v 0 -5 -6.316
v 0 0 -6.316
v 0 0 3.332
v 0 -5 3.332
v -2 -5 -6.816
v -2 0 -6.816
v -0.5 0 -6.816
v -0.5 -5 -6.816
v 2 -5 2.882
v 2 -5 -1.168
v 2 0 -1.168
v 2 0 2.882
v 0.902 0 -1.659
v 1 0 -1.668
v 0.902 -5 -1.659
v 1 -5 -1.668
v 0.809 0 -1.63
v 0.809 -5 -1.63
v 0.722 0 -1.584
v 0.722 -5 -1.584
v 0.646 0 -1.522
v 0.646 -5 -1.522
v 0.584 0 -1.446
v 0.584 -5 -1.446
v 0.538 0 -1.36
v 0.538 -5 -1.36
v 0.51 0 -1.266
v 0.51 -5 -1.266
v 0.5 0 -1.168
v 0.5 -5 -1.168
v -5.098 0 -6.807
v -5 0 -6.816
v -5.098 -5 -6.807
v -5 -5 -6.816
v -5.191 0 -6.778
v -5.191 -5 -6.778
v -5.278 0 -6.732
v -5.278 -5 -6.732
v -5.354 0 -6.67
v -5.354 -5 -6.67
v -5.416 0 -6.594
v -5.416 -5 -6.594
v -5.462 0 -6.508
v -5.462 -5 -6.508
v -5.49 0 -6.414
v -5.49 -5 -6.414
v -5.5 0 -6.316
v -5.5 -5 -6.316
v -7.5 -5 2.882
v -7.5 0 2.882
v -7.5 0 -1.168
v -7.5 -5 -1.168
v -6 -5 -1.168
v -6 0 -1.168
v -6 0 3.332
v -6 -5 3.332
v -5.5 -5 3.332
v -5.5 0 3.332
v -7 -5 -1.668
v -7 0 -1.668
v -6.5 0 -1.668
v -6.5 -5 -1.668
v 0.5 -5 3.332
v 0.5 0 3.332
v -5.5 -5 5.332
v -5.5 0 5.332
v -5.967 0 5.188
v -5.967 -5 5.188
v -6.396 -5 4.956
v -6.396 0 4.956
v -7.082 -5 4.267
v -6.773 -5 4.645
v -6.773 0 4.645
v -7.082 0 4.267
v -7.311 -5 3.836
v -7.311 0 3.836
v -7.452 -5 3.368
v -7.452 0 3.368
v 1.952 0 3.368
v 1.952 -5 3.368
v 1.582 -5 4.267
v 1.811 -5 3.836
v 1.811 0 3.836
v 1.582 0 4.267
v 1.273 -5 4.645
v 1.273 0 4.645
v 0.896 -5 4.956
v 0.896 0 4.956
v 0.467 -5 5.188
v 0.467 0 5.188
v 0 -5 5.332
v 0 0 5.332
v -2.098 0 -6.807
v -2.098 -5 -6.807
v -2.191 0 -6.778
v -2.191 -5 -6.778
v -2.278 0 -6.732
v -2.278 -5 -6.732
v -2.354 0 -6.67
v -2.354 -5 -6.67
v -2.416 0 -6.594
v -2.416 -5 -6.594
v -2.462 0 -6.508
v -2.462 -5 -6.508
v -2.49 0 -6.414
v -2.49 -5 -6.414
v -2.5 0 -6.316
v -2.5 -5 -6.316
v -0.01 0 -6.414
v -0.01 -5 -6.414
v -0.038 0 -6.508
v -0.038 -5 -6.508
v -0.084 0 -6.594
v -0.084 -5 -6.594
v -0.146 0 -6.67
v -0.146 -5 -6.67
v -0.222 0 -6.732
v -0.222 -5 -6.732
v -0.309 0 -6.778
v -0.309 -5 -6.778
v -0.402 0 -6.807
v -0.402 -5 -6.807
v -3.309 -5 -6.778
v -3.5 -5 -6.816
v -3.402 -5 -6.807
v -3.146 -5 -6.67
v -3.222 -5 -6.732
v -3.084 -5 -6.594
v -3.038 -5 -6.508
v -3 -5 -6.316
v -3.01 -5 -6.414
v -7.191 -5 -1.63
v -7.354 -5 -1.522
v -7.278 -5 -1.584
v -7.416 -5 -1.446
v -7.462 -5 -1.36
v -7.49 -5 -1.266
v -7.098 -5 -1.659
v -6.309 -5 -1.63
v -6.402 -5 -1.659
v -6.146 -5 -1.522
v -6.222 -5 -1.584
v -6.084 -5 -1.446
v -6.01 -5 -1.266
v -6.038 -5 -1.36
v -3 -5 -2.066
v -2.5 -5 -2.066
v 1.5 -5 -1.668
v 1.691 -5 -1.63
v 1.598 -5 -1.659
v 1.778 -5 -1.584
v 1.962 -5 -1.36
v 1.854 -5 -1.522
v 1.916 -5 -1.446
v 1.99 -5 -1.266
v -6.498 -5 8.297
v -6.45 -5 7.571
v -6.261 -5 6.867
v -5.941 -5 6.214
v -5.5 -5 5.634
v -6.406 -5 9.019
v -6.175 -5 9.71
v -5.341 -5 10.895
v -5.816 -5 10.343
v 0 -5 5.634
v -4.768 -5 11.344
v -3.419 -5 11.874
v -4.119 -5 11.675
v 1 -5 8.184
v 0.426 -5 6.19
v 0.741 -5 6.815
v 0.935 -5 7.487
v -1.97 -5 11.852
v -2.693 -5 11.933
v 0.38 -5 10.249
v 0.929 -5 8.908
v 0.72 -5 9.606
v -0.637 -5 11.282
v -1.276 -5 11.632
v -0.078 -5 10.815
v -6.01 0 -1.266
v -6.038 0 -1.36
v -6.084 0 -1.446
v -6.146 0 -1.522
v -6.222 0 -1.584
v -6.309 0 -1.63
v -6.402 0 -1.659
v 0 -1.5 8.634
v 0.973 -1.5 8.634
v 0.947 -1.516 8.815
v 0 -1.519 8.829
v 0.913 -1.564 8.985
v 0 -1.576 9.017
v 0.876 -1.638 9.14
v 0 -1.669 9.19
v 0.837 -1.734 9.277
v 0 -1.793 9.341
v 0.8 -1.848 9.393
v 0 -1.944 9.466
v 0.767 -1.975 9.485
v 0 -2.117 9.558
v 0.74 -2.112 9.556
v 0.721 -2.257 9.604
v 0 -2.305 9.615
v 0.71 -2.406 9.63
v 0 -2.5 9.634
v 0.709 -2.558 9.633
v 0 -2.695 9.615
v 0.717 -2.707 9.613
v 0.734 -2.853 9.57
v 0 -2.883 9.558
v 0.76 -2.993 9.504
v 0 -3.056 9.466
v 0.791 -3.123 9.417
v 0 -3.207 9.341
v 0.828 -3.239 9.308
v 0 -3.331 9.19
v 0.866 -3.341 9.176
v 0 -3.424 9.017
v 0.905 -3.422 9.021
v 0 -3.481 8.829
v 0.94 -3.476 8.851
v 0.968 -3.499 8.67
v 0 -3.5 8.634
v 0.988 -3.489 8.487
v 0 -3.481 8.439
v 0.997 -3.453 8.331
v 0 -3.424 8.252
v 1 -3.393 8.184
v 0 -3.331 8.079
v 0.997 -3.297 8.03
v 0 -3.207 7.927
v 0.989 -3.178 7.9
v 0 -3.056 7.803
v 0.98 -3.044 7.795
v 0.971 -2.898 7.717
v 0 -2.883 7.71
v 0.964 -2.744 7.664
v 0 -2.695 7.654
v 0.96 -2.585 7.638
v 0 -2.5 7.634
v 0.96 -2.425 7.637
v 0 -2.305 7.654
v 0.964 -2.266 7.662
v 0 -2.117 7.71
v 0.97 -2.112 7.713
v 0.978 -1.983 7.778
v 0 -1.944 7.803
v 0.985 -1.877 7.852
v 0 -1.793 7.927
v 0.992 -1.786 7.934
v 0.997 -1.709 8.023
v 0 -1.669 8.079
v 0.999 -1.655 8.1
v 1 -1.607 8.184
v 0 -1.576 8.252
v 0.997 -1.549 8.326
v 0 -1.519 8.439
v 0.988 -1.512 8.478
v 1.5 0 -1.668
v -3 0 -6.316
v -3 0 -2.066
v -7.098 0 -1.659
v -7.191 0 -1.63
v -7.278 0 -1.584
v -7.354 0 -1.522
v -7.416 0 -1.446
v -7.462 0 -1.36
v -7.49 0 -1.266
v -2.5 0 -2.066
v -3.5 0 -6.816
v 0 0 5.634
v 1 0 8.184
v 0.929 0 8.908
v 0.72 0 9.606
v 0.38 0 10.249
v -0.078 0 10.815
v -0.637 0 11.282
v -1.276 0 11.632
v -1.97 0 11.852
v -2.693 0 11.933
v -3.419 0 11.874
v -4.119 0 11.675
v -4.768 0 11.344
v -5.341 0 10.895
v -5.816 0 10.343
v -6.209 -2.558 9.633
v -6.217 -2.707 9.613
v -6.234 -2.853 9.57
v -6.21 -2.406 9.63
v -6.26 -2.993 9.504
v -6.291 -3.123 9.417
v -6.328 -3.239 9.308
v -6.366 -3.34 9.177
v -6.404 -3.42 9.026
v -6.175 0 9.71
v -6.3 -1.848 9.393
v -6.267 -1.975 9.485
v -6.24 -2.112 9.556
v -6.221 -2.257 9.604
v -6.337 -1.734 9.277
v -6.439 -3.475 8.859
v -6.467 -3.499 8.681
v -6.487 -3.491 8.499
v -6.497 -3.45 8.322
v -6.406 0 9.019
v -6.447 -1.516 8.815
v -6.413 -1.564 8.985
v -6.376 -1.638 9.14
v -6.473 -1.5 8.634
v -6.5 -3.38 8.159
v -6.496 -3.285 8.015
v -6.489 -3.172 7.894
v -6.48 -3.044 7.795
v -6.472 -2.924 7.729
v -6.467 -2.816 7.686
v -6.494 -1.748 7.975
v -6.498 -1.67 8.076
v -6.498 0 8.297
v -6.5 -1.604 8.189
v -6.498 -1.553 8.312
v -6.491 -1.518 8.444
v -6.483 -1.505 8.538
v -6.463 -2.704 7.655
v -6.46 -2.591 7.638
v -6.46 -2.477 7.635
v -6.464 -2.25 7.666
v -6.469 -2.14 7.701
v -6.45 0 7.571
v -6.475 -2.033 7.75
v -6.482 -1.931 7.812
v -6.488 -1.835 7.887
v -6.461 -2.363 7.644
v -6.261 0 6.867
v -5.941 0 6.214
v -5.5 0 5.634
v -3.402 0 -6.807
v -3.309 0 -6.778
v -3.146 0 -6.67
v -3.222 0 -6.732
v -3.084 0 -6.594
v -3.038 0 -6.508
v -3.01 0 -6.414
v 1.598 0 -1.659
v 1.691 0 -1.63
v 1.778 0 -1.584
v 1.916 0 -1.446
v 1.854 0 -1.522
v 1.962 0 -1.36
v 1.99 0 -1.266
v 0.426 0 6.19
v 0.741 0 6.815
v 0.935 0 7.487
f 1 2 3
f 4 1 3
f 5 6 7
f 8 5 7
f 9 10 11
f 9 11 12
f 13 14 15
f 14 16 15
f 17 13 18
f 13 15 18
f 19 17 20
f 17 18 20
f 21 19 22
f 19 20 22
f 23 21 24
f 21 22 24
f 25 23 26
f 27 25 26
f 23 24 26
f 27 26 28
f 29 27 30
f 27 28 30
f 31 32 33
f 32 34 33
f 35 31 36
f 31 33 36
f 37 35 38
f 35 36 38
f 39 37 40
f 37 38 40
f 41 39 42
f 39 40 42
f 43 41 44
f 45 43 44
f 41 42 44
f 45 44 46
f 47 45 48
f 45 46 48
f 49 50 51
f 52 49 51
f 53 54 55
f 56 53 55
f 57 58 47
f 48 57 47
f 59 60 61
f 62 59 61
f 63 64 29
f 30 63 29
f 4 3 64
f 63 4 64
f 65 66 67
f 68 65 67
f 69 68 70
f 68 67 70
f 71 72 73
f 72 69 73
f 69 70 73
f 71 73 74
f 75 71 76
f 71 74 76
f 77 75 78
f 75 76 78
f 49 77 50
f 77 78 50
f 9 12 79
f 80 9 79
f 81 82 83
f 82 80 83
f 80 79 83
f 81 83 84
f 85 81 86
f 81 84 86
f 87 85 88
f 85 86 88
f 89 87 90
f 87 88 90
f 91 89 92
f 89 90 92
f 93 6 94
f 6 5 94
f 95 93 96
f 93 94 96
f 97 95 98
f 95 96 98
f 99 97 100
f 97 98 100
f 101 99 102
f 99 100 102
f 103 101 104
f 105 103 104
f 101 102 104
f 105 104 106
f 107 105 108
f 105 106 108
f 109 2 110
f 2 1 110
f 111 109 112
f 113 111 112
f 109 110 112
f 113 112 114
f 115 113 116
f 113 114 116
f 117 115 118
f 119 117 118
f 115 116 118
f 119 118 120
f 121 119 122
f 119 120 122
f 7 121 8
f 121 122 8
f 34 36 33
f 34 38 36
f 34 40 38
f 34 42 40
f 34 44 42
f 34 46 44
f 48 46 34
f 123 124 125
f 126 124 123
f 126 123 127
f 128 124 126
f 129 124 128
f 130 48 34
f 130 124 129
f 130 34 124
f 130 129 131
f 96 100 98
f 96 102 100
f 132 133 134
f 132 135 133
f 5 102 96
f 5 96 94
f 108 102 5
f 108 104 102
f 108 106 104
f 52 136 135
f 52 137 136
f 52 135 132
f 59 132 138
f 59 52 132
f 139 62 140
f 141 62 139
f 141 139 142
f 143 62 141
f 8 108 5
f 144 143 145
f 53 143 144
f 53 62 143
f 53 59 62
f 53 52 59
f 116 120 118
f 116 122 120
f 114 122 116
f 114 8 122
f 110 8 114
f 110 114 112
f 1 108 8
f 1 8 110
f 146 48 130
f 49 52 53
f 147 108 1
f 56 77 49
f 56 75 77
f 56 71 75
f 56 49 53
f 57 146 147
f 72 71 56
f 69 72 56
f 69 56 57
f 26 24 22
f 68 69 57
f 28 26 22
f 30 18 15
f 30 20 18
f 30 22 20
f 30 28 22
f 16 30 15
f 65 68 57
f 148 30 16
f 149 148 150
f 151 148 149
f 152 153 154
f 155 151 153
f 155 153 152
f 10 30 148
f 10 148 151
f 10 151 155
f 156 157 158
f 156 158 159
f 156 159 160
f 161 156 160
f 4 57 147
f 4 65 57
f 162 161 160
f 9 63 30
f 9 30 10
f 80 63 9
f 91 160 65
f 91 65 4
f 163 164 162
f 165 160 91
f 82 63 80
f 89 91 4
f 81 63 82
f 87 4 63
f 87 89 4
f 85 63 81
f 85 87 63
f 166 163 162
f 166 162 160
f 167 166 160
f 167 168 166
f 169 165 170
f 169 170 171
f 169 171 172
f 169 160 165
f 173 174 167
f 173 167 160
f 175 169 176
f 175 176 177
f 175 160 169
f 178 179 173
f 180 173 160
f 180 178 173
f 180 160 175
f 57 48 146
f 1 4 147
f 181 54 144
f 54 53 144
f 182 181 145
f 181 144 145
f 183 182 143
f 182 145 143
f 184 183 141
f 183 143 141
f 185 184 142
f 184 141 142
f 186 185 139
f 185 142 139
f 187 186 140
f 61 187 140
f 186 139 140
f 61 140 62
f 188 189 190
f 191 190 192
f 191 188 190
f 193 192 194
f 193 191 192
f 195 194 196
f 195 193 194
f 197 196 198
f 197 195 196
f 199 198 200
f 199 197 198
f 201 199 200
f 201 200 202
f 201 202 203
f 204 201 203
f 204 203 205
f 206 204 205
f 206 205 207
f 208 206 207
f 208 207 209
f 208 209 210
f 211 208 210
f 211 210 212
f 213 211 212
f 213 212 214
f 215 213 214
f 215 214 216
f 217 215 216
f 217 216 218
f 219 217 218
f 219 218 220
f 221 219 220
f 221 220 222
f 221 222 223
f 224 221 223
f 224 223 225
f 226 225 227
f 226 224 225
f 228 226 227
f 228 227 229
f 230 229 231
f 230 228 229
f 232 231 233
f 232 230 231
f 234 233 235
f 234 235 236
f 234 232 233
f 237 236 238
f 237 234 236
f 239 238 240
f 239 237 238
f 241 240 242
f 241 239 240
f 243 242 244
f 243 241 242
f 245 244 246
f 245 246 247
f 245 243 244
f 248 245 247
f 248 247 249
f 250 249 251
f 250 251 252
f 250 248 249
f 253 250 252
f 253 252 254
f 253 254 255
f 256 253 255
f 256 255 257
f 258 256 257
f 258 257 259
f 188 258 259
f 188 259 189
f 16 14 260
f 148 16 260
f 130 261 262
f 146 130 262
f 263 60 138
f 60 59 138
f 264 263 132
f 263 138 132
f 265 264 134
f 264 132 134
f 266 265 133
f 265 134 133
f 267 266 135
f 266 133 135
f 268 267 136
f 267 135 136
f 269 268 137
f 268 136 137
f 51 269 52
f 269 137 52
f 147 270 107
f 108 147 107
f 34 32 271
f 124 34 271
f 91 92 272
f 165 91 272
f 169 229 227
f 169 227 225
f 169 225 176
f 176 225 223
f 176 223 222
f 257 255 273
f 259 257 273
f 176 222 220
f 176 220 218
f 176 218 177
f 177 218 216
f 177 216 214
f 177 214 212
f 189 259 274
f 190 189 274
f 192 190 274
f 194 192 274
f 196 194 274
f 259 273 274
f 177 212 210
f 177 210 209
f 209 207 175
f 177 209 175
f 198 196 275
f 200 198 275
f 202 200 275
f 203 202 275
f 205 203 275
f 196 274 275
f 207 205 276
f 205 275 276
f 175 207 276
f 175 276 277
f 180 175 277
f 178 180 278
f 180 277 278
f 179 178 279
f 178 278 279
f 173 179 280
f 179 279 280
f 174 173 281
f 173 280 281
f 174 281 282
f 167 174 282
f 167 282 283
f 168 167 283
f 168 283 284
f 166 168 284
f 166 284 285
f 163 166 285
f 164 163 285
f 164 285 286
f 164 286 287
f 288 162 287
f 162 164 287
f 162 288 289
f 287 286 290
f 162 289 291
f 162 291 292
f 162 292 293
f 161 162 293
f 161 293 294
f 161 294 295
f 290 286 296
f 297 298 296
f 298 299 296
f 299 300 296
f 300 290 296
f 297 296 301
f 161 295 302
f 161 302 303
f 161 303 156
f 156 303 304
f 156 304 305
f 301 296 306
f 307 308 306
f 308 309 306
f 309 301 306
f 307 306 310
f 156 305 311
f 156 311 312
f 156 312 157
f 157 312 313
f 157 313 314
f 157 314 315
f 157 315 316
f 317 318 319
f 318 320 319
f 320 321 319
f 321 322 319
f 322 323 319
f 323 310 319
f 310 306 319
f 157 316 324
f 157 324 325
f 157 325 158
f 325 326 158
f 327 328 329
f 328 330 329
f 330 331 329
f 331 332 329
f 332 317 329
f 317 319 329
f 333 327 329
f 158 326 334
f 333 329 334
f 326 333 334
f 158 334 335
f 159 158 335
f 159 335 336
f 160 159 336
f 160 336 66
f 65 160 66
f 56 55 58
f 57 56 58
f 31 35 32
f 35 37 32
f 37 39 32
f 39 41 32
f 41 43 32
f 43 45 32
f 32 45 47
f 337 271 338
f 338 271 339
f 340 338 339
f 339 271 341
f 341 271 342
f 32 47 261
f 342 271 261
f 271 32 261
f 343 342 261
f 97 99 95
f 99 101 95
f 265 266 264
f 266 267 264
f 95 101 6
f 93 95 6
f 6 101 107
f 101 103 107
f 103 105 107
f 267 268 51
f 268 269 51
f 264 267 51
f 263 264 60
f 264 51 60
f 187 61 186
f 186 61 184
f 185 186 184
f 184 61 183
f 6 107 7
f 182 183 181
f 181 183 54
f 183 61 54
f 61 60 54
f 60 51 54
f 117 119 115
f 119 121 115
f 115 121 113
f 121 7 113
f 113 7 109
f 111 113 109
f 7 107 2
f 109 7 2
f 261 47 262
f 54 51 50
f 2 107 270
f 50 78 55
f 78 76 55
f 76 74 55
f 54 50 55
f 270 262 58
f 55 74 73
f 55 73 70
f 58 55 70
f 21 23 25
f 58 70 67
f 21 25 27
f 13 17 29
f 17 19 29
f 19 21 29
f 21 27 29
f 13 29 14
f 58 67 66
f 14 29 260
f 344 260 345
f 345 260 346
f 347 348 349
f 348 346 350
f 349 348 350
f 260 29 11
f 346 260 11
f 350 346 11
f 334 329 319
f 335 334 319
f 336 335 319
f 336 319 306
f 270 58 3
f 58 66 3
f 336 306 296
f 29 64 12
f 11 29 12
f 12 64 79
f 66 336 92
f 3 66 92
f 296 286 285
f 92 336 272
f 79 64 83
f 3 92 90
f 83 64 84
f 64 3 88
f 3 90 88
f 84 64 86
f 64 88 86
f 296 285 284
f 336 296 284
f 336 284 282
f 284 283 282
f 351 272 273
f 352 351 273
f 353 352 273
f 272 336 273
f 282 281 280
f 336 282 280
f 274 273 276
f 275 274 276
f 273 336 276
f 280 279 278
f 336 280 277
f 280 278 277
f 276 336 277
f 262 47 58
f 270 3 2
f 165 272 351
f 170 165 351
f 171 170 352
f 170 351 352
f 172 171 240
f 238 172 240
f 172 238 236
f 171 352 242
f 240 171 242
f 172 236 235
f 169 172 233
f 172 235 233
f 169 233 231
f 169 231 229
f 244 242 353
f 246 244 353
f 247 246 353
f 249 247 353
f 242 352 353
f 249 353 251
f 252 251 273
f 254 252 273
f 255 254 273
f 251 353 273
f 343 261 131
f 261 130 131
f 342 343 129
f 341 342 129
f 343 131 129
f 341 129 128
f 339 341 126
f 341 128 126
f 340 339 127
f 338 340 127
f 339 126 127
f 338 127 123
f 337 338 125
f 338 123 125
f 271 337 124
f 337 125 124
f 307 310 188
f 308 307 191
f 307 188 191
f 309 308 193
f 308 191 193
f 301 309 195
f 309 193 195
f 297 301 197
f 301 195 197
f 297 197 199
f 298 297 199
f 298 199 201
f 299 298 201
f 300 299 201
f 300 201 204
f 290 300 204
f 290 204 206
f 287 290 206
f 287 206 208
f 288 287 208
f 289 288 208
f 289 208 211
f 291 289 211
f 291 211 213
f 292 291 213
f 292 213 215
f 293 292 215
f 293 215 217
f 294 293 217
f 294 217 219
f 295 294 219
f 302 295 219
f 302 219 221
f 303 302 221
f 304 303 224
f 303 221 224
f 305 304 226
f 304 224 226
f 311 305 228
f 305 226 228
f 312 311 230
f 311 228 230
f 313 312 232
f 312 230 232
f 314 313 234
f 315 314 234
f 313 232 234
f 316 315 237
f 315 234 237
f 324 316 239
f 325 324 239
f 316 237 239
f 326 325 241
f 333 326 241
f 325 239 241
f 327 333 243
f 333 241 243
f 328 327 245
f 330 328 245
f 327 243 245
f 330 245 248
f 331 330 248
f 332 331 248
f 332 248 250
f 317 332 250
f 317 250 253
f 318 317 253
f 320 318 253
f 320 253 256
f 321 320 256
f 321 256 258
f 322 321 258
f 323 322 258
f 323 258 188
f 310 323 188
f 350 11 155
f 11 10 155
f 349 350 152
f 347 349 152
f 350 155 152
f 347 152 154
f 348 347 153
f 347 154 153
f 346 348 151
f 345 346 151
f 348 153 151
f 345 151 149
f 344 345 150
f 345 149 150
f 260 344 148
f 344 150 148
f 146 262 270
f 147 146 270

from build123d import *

# Parameters (mm, degrees)
F1_DEPTH      = 10
F2_T1_DEPTH   = 34.4948974279
F3_R          = 1
F4_SCALE      = 0.5
F5_R          = 1
F6_DEPTH      = 25
F6_DEPTH_BACK = 25


# Not quite as in the source:
# - a fillet or chamfer that OpenCascade refuses, or shapes differently, is made with other operations: its cross-section is extruded or revolved along the edge and cut away or added


with BuildPart() as f1:
    # F0 (on Front) → F1 (new body)
    with BuildSketch(Plane.XZ):
        with BuildLine():
            Line((-11, 11.2686367076), (-11, 16.3676562212))
            Line((-11, 16.3676562212), (0, 16.3676562212))
            Line((0, 16.3676562212), (0, 11.2686367076))
            ThreePointArc((0, 11.2686367076), (1.4821200219, 13.6290434337), (2, 16.3676562212))
            ThreePointArc((2, 16.3676562212), (-8.2386127875, 23.3497762431), (-11, 11.2686367076))
        make_face()
        with BuildLine():
            Line((0, 16.3676562212), (-11, 16.3676562212))
            Line((-11, 16.3676562212), (-11, 11.2686367076))
            ThreePointArc((-11, 11.2686367076), (-5.5, 8.8676562212), (0, 11.2686367076))
            Line((0, 11.2686367076), (0, 16.3676562212))
        make_face()
        with BuildLine():
            ThreePointArc((0, 11.2686367076), (-5.5, 8.8676562212), (-11, 11.2686367076))
            Line((-11, 11.2686367076), (-11, 10.6633629519))
            Line((-11, 10.6633629519), (-11, 6.6633629519))
            Line((-11, 6.6633629519), (-11, -3.3366370481))
            Line((-11, -3.3366370481), (-11, -13.6323437788))
            Line((-11, -13.6323437788), (-6, -13.6323437788))
            Line((-6, -13.6323437788), (-6, -4.1323437788))
            Line((-6, -4.1323437788), (-5, -4.1323437788))
            Line((-5, -4.1323437788), (-5, -13.6323437788))
            Line((-5, -13.6323437788), (0, -13.6323437788))
            Line((0, -13.6323437788), (0, -3.3363437788))
            Line((0, -3.3363437788), (0, 6.6636562212))
            Line((0, 6.6636562212), (0, 10.6636562212))
            Line((0, 10.6636562212), (0, 11.2686367076))
        make_face()
        Polygon((-11, 6.6633629519), (-11, 10.6633629519), (-15, 10.6633629519), (-15, -3.3366370481), (-12, -3.3366370481), (-12, 6.6633629519), align=None)
        Polygon((4, 10.6636562212), (0, 10.6636562212), (0, 6.6636562212), (1, 6.6636562212), (1, -3.3363437788), (4, -3.3363437788), align=None)
    extrude(amount=F1_DEPTH)

    # F2: fillet of radius 5 on 2 edges, made by hand

    # F2_s2 → F2_t1 (cut)
    with BuildSketch(Plane.XZ.offset(-12.2474487139)):
        with BuildLine():
            ThreePointArc((4, 5.7646767356), (2.8729833462, 8.9269543958), (0, 10.6636562212))
            Line((0, 10.6636562212), (4, 10.6636562212))
            Line((4, 10.6636562212), (4, 5.7646767356))
        make_face()
        with BuildLine():
            ThreePointArc((-11, 10.6633629519), (-13.8729833462, 8.9266611265), (-15, 5.7643834664))
            Line((-15, 5.7643834664), (-15, 10.6633629519))
            Line((-15, 10.6633629519), (-11, 10.6633629519))
        make_face()
    extrude(amount=F2_T1_DEPTH, mode=Mode.SUBTRACT)

    # F3
    f3_edges = [f1.edges().sort_by_distance(p)[0] for p in [
        (-15, -5, -3.336637),
        (-12, -5, -3.336637),
        (1, -5, -3.336344),
        (4, -5, -3.336344),
        (-5, -5, -13.632344),
        (0, -5, -13.632344),
        (-11, -5, -13.632344),
        (-6, -5, -13.632344),
    ]]
    fillet(f3_edges, radius=F3_R)


with BuildPart() as f1_1:
    # F4: moved
    add(f1.part.scale(F4_SCALE))

    # F5 (on Right) → F6 (cut, two sides)
    with BuildSketch(Plane.YZ) as f6_sk:
        with Locations((-2.5, 8.6343183538)):
            Circle(F5_R)
    extrude(amount=-F6_DEPTH, mode=Mode.SUBTRACT)
    extrude(f6_sk.sketch, amount=F6_DEPTH_BACK, mode=Mode.SUBTRACT)


solid = f1_1.part
